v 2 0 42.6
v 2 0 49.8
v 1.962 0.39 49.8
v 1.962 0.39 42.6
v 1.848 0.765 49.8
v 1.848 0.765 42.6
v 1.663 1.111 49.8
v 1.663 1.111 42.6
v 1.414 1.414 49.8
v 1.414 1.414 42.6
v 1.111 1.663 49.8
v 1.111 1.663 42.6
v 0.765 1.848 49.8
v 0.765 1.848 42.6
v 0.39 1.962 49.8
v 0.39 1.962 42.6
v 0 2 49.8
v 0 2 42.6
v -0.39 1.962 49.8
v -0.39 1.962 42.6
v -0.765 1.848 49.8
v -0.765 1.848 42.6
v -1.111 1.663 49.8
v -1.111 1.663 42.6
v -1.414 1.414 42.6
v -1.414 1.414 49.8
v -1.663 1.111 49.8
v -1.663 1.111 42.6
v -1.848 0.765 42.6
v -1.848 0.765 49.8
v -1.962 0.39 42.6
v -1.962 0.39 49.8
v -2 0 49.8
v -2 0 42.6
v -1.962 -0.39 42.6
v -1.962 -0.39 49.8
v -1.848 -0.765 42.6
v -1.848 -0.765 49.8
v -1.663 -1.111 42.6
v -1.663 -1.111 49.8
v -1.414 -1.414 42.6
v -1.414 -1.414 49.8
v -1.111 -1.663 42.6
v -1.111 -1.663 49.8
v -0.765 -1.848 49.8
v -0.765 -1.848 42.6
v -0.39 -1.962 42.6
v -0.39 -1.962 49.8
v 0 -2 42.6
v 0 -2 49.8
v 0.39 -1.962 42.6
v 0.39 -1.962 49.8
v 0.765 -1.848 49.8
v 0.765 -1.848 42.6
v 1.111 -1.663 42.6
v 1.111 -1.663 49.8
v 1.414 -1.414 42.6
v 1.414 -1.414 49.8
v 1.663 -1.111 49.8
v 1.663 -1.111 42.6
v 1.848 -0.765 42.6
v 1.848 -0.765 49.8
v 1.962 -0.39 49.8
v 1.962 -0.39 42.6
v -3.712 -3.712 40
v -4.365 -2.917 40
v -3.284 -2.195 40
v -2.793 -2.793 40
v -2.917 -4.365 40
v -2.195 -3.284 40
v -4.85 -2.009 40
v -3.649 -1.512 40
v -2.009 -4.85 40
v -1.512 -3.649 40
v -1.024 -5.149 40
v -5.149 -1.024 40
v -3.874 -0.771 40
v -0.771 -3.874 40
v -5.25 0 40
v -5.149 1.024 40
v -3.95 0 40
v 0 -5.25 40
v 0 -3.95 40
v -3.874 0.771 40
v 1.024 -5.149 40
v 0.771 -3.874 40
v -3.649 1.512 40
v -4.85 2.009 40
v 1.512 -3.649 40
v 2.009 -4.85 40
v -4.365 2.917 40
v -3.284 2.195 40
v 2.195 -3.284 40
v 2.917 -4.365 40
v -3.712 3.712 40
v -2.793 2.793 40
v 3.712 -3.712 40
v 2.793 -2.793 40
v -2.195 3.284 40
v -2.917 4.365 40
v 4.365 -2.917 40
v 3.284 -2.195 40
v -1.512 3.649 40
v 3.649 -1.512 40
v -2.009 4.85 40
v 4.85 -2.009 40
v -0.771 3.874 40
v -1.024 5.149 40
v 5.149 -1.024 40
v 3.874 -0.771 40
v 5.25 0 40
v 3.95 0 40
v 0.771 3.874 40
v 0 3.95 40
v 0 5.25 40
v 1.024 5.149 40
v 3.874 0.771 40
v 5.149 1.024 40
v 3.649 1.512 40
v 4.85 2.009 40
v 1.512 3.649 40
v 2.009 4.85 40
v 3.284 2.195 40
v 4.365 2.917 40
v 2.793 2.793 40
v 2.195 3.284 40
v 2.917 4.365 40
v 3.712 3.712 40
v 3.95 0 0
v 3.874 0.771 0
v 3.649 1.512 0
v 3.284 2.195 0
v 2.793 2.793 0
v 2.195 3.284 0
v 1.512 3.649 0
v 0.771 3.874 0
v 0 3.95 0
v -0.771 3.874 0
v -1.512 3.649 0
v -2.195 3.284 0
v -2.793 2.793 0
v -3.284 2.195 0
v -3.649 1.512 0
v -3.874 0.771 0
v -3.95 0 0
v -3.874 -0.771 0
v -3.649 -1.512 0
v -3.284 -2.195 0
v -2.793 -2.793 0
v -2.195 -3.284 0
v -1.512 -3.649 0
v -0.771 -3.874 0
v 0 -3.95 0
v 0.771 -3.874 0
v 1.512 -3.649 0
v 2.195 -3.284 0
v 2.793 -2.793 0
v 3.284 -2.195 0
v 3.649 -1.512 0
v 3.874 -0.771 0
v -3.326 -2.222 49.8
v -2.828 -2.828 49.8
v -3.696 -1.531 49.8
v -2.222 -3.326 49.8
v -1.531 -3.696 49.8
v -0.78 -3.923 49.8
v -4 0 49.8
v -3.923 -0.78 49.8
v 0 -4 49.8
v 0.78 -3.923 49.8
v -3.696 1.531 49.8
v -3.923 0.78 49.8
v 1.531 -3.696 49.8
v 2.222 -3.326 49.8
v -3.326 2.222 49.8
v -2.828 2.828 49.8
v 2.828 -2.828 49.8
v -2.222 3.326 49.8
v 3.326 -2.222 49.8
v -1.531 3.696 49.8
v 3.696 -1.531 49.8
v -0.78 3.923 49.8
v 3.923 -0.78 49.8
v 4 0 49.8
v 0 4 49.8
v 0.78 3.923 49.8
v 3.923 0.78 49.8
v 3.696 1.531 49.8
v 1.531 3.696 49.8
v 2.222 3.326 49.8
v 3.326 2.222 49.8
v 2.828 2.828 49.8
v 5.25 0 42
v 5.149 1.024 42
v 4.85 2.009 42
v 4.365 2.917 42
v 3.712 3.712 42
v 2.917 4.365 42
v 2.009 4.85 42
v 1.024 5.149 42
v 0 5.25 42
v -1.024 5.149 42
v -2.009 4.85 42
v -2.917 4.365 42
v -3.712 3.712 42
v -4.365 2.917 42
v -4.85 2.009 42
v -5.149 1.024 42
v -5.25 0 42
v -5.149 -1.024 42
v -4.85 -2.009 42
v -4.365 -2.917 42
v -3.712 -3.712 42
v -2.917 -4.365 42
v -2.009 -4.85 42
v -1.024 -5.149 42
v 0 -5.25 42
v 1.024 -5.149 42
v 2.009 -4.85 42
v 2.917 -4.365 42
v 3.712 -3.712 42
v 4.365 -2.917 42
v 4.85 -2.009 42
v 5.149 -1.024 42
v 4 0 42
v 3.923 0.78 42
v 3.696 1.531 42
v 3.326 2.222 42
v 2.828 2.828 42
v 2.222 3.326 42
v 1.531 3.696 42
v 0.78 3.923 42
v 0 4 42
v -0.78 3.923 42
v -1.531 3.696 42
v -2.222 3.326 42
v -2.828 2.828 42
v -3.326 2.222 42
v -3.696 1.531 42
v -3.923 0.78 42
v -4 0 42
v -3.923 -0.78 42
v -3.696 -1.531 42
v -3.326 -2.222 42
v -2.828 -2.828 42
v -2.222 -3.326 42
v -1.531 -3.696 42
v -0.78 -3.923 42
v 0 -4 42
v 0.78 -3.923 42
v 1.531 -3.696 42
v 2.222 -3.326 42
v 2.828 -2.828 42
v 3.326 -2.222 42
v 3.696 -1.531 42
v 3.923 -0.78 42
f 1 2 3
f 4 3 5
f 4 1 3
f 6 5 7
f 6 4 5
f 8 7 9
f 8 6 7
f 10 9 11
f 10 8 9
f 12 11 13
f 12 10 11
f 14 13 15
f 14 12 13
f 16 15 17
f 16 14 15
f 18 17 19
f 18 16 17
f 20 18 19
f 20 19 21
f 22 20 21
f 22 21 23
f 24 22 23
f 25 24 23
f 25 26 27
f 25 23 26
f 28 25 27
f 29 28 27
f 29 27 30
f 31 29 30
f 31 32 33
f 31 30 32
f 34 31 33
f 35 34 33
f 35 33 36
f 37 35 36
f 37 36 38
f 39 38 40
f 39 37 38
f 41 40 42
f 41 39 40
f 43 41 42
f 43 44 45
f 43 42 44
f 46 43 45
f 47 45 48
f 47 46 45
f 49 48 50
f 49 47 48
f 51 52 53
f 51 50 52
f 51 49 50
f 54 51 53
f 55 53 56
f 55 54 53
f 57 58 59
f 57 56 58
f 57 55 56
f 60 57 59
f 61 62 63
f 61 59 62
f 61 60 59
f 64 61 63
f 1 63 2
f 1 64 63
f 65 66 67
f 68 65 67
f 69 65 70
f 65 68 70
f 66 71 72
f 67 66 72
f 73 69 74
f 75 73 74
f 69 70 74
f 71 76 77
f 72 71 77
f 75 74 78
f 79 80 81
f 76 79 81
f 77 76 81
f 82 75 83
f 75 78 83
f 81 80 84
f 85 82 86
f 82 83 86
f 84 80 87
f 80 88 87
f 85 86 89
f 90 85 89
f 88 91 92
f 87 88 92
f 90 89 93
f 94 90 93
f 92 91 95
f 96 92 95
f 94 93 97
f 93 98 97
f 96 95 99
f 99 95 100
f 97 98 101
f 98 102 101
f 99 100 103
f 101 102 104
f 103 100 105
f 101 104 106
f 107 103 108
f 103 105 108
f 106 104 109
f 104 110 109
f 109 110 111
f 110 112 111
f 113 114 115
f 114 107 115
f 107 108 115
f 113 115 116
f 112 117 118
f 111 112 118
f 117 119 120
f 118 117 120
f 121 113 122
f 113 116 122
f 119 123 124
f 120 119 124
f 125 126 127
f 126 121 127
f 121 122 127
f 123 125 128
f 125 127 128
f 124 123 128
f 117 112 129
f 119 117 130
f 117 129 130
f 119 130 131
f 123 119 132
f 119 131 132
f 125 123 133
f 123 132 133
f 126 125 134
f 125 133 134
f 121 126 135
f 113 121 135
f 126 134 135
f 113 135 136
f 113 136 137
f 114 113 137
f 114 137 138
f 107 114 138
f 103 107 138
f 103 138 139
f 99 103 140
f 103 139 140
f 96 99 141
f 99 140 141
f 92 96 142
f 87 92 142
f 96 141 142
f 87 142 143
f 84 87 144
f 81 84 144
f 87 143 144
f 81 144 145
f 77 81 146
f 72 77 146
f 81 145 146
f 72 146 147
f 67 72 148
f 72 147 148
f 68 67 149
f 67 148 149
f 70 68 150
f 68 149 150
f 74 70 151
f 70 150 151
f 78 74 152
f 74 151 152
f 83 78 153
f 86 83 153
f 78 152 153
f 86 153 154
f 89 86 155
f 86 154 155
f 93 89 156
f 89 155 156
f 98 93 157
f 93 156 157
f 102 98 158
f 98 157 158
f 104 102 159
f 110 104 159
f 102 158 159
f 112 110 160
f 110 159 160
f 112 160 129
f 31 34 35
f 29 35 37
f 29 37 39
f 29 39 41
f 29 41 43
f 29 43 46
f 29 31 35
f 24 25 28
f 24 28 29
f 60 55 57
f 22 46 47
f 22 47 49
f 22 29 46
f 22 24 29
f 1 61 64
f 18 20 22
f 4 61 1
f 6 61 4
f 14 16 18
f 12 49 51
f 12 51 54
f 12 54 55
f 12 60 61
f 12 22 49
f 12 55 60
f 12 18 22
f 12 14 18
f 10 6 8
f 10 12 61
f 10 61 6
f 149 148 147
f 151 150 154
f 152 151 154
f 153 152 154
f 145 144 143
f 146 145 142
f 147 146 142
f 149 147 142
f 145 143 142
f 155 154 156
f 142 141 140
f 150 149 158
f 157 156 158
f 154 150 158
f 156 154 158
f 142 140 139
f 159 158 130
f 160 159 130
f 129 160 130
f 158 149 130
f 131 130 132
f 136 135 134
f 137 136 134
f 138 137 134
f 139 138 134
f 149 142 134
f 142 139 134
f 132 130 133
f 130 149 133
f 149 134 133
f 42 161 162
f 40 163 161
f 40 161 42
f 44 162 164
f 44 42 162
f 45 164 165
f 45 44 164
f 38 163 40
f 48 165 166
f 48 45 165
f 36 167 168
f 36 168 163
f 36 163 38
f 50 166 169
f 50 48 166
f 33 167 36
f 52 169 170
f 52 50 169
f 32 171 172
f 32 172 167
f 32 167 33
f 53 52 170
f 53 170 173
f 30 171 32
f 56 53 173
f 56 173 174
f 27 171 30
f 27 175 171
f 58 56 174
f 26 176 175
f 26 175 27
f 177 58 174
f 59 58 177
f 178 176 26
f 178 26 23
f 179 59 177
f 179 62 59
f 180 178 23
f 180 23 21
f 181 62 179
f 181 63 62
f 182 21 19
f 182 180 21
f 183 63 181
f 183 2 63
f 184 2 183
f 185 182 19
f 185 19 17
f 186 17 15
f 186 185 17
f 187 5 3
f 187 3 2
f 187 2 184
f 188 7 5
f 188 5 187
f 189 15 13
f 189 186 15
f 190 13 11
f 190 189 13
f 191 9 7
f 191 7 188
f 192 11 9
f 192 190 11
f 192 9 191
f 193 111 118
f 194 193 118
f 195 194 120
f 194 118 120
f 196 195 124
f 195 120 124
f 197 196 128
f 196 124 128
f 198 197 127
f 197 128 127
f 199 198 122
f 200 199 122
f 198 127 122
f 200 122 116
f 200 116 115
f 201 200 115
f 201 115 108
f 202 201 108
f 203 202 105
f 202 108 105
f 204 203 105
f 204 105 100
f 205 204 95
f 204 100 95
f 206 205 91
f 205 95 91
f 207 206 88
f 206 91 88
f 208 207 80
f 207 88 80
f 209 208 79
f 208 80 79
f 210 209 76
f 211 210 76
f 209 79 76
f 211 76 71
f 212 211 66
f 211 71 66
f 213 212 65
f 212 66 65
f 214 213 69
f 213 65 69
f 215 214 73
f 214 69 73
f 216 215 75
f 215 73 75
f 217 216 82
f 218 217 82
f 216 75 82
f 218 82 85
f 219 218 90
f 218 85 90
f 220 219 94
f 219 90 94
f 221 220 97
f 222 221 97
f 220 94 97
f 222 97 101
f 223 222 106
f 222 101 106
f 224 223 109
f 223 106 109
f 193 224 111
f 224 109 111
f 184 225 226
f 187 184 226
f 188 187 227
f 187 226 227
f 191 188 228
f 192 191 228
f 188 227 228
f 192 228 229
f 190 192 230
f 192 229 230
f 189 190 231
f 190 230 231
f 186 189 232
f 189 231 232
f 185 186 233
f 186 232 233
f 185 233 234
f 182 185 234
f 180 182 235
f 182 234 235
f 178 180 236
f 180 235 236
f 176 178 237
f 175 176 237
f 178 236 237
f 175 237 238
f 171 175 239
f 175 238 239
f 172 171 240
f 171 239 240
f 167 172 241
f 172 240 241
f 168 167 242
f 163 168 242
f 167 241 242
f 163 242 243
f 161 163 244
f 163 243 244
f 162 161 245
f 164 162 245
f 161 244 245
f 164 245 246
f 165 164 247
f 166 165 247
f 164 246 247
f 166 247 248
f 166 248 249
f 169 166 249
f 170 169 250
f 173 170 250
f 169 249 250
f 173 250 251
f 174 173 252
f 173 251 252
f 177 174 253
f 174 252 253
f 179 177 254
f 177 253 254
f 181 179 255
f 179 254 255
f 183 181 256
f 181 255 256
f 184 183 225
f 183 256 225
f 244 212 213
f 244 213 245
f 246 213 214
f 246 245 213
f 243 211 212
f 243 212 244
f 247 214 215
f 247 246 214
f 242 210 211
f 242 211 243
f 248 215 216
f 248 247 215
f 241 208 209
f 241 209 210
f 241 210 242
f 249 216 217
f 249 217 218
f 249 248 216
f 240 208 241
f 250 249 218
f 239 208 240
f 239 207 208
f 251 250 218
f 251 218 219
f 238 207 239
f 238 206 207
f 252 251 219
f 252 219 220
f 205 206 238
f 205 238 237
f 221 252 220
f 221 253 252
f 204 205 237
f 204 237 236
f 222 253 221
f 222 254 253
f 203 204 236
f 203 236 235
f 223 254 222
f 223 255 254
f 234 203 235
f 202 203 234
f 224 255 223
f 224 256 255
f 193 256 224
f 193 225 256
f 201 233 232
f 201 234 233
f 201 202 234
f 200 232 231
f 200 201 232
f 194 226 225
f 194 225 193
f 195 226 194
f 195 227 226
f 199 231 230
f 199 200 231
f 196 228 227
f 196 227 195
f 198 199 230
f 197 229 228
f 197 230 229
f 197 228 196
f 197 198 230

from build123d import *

# Parameters (mm, degrees)
S01_PRINTABLE_SLIDING_PIN_7_90_MM_R            = 3.95
F_01_PRINTABLE_SLIDING_PIN_7_90_MM_DEPTH       = 40
F_02_START                                     = 40
S02_RECESSED_LOAD_SHOULDER_R                   = 5.25
F_02_RECESSED_LOAD_SHOULDER_DEPTH              = 2
F_03_START                                     = 42
S03_LOCATING_PILOT_THROUGH_SWING_ARM_R         = 4
F_03_LOCATING_PILOT_THROUGH_SWING_ARM_DEPTH    = 7.8
F_04_START                                     = 42.6
S04_M3_HEAT_SET_POCKET_IN_SUPPORTED_RO_R       = 2
F_04_M3_HEAT_SET_POCKET_IN_SUPPORTED_ROO_DEPTH = 7.3


with BuildPart() as part:
    # S01 - Printable sliding pin - 7.90 mm → 01 - Printable sliding pin - 7.90 mm (new body)
    with BuildSketch(Plane.XY):
        Circle(S01_PRINTABLE_SLIDING_PIN_7_90_MM_R)
    extrude(amount=F_01_PRINTABLE_SLIDING_PIN_7_90_MM_DEPTH)

    # S02 - Recessed load shoulder → 02 - Recessed load shoulder (add)
    with BuildSketch(Plane.XY.offset(F_02_START)):
        Circle(S02_RECESSED_LOAD_SHOULDER_R)
    extrude(amount=F_02_RECESSED_LOAD_SHOULDER_DEPTH)

    # S03 - Locating pilot through swing arm → 03 - Locating pilot through swing arm (add)
    with BuildSketch(Plane.XY.offset(F_03_START)):
        Circle(S03_LOCATING_PILOT_THROUGH_SWING_ARM_R)
    extrude(amount=F_03_LOCATING_PILOT_THROUGH_SWING_ARM_DEPTH)

    # S04 - M3 heat-set pocket in supported root → 04 - M3 heat-set pocket in supported root (cut)
    with BuildSketch(Plane.XY.offset(F_04_START)):
        Circle(S04_M3_HEAT_SET_POCKET_IN_SUPPORTED_RO_R)
    extrude(amount=F_04_M3_HEAT_SET_POCKET_IN_SUPPORTED_ROO_DEPTH, mode=Mode.SUBTRACT)


solid = part.part
